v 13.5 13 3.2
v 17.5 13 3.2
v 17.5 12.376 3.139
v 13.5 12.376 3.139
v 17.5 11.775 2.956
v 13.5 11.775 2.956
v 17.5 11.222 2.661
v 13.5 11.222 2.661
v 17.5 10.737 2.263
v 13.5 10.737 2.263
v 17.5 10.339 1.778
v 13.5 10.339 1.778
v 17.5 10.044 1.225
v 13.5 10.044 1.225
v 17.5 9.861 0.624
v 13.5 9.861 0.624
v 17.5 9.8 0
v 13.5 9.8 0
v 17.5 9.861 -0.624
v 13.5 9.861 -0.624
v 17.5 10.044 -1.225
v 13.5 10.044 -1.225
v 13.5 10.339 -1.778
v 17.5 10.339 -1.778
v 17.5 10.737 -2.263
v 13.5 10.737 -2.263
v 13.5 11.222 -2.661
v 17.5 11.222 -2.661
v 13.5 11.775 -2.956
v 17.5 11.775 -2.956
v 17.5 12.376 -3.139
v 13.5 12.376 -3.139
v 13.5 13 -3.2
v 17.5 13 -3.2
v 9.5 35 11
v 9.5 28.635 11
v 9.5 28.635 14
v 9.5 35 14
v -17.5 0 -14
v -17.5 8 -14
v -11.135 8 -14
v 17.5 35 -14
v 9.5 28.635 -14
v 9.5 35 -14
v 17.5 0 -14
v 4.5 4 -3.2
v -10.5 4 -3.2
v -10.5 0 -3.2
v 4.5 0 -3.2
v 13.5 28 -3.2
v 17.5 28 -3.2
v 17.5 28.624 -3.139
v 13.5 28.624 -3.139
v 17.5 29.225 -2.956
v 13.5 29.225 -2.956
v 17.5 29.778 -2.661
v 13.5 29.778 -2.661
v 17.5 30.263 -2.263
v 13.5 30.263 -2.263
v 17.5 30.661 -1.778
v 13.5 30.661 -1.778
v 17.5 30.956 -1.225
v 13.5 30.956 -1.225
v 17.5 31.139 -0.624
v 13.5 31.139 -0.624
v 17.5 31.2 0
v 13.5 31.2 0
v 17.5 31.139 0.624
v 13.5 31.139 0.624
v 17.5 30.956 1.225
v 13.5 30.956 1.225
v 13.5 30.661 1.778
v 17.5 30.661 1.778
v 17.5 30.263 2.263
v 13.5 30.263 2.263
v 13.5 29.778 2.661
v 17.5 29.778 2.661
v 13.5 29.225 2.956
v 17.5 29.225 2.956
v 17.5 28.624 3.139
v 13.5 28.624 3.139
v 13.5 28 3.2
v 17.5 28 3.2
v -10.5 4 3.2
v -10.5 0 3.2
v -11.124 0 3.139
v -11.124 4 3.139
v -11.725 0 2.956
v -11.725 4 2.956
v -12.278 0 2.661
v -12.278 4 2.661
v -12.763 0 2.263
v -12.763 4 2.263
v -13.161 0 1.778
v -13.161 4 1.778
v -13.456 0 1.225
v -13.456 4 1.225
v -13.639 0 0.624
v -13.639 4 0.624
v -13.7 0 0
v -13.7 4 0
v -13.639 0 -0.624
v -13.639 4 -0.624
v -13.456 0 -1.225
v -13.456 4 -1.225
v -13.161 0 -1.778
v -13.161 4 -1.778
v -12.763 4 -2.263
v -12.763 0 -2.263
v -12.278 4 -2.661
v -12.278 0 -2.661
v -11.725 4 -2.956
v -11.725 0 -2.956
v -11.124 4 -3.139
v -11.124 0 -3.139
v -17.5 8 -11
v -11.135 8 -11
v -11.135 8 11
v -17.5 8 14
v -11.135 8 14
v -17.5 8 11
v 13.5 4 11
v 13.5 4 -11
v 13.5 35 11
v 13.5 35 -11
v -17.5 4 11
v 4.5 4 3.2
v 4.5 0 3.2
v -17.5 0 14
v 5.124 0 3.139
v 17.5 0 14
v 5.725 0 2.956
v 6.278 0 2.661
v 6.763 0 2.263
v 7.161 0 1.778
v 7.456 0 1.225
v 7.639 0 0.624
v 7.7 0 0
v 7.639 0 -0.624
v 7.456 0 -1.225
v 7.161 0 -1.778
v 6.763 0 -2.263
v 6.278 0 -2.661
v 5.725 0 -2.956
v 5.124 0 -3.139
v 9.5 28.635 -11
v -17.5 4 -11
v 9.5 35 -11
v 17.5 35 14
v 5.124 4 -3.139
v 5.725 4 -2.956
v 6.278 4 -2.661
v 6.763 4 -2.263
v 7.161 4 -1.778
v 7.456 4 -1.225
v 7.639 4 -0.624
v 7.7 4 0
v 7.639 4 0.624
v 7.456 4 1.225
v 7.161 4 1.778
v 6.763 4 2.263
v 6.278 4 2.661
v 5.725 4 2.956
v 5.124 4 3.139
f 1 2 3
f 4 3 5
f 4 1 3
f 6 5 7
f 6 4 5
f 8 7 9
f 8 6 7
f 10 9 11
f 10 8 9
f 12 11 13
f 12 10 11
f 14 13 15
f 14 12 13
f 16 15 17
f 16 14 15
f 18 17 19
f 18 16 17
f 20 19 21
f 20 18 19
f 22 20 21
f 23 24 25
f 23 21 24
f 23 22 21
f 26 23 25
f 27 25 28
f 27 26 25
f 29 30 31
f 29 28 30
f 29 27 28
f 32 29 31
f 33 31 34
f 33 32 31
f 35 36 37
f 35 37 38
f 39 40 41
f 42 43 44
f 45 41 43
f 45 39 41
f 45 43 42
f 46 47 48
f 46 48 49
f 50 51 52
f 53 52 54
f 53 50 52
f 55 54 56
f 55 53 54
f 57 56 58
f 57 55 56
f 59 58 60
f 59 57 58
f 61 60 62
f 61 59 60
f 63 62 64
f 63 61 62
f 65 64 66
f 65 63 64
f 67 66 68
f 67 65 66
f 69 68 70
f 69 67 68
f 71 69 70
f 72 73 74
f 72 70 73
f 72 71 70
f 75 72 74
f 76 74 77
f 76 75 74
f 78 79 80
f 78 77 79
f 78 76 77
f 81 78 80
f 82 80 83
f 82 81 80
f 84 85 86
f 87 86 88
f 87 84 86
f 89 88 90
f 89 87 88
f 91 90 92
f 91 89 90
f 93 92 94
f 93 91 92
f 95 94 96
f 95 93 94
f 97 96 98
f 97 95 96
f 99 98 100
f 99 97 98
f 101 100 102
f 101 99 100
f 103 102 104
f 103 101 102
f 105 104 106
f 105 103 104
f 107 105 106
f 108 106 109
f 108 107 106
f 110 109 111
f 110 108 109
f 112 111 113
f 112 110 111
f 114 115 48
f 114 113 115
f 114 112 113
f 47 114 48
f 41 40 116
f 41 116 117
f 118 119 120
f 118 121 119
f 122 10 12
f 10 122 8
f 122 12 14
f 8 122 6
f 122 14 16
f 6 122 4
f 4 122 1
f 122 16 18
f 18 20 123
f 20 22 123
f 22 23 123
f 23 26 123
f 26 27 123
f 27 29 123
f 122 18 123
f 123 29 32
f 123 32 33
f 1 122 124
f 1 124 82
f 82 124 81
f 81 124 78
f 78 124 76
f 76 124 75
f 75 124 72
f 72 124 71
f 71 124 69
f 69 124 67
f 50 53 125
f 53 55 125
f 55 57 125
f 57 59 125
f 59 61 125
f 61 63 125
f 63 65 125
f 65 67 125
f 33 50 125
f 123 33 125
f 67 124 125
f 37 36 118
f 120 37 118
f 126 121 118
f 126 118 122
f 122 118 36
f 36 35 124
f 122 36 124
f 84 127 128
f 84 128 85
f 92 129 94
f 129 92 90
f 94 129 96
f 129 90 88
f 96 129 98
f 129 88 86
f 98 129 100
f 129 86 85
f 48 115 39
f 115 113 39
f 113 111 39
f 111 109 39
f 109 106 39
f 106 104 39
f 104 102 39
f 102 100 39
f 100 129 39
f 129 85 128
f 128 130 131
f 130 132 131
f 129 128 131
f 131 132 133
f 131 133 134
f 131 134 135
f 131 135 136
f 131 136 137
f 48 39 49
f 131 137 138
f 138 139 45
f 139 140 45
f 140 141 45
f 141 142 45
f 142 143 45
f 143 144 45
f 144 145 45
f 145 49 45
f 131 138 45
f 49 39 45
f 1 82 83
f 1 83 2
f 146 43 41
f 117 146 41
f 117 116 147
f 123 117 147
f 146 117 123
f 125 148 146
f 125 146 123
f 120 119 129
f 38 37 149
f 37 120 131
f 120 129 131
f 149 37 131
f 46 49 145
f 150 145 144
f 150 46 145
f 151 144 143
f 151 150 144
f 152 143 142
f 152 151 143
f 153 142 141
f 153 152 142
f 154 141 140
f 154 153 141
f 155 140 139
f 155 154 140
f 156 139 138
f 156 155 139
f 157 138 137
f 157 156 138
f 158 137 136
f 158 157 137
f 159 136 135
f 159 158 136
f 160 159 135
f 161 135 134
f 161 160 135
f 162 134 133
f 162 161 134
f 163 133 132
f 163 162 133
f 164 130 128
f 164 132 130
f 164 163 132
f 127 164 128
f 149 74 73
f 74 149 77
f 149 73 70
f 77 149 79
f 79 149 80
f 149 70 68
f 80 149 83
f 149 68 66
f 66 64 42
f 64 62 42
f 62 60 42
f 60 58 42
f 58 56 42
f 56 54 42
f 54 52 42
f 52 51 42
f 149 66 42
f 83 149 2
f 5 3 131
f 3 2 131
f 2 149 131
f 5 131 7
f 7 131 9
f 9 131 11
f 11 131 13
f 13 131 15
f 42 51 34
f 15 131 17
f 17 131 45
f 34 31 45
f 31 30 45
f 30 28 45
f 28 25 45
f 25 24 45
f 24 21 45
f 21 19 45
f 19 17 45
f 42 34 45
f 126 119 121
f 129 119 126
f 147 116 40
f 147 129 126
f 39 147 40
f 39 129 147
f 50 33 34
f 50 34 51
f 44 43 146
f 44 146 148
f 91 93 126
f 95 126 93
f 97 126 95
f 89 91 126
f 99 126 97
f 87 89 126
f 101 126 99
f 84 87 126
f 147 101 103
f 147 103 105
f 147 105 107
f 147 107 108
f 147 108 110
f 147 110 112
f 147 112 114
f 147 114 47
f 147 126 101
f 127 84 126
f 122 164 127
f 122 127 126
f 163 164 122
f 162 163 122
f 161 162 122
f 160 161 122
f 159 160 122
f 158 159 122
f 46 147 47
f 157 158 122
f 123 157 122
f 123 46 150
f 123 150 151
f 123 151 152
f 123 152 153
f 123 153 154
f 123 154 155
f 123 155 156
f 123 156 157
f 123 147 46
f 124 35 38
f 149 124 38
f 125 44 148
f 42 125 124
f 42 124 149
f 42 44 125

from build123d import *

# Parameters (mm, degrees)
SKETCH1_W               = 35
SKETCH1_H               = 28
BOSS_EXTRUDE1_DEPTH     = 35
SKETCH2_W               = 33.80681128
SKETCH2_H               = 22
CUT_EXTRUDE1_DEPTH      = 31
CUT_EXTRUDE2_DEPTH      = 49.117044797
CUT_EXTRUDE2_DEPTH_BACK = 49.117044797
CUT_EXTRUDE3_REACH      = 40.252
CUT_EXTRUDE4_REACH      = 43.343


with BuildPart() as part:
    # Sketch1 → Boss-Extrude1 (new body)
    with BuildSketch(Plane(origin=(0, 0, 0), x_dir=(1, 0, 0), z_dir=(0, 1, 0))):
        Rectangle(SKETCH1_W, SKETCH1_H)
    extrude(amount=BOSS_EXTRUDE1_DEPTH)

    # Sketch2 → Cut-Extrude1 (cut)
    with BuildSketch(Plane(origin=(0, 35, 0), x_dir=(1, 0, 0), z_dir=(0, 1, 0))):
        with Locations((-3.40340564, 0)):
            Rectangle(SKETCH2_W, SKETCH2_H)
    extrude(amount=-CUT_EXTRUDE1_DEPTH, mode=Mode.SUBTRACT)

    # Sketch3 → Cut-Extrude2 (cut, two sides: drawn at the far end of the back side and taken through both)
    with BuildSketch(Plane.XY.offset(14).offset(-CUT_EXTRUDE2_DEPTH_BACK)):
        Polygon((9.5, 133.408144421), (9.5, 35), (9.5, 28.634736483), (-11.134736483, 8), (-17.5, 8), (-115.908144421, 8), (-255.07827691, 147.170132488), (-129.670132488, 272.57827691), align=None)
    extrude(amount=CUT_EXTRUDE2_DEPTH + CUT_EXTRUDE2_DEPTH_BACK, mode=Mode.SUBTRACT)

    # Sketch4 → Cut-Extrude3 (cut, up to next)
    with BuildSketch(Plane(origin=(0, 4, 0), x_dir=(1, 0, 0), z_dir=(0, 1, 0)), mode=Mode.PRIVATE) as cut_extrude3_sk1:
        with BuildLine():
            Line((4.5, -3.2), (-10.5, -3.2))
            ThreePointArc((-10.5, -3.2), (-13.7, 0), (-10.5, 3.2))
            Line((-10.5, 3.2), (4.5, 3.2))
            ThreePointArc((4.5, 3.2), (7.7, 0), (4.5, -3.2))
        make_face()
    cut_extrude3_tool1 = extrude(cut_extrude3_sk1.sketch, amount=-CUT_EXTRUDE3_REACH, mode=Mode.PRIVATE) & part.part
    add(cut_extrude3_tool1.solids().sort_by_distance((-3, 4, 0))[0], mode=Mode.SUBTRACT)

    # Sketch5 → Cut-Extrude4 (cut, up to next)
    with BuildSketch(Plane(origin=(13.5, 23.5, 0), x_dir=(0, 1, 0), z_dir=(-1, 0, 0)), mode=Mode.PRIVATE) as cut_extrude4_sk1:
        with BuildLine():
            Line((4.5, -3.2), (-10.5, -3.2))
            ThreePointArc((-10.5, -3.2), (-13.7, 0), (-10.5, 3.2))
            Line((-10.5, 3.2), (4.5, 3.2))
            ThreePointArc((4.5, 3.2), (7.7, 0), (4.5, -3.2))
        make_face()
    cut_extrude4_tool1 = extrude(cut_extrude4_sk1.sketch, amount=-CUT_EXTRUDE4_REACH, mode=Mode.PRIVATE) & part.part
    add(cut_extrude4_tool1.solids().sort_by_distance((13.5, 20.5, 0))[0], mode=Mode.SUBTRACT)


solid = part.part
